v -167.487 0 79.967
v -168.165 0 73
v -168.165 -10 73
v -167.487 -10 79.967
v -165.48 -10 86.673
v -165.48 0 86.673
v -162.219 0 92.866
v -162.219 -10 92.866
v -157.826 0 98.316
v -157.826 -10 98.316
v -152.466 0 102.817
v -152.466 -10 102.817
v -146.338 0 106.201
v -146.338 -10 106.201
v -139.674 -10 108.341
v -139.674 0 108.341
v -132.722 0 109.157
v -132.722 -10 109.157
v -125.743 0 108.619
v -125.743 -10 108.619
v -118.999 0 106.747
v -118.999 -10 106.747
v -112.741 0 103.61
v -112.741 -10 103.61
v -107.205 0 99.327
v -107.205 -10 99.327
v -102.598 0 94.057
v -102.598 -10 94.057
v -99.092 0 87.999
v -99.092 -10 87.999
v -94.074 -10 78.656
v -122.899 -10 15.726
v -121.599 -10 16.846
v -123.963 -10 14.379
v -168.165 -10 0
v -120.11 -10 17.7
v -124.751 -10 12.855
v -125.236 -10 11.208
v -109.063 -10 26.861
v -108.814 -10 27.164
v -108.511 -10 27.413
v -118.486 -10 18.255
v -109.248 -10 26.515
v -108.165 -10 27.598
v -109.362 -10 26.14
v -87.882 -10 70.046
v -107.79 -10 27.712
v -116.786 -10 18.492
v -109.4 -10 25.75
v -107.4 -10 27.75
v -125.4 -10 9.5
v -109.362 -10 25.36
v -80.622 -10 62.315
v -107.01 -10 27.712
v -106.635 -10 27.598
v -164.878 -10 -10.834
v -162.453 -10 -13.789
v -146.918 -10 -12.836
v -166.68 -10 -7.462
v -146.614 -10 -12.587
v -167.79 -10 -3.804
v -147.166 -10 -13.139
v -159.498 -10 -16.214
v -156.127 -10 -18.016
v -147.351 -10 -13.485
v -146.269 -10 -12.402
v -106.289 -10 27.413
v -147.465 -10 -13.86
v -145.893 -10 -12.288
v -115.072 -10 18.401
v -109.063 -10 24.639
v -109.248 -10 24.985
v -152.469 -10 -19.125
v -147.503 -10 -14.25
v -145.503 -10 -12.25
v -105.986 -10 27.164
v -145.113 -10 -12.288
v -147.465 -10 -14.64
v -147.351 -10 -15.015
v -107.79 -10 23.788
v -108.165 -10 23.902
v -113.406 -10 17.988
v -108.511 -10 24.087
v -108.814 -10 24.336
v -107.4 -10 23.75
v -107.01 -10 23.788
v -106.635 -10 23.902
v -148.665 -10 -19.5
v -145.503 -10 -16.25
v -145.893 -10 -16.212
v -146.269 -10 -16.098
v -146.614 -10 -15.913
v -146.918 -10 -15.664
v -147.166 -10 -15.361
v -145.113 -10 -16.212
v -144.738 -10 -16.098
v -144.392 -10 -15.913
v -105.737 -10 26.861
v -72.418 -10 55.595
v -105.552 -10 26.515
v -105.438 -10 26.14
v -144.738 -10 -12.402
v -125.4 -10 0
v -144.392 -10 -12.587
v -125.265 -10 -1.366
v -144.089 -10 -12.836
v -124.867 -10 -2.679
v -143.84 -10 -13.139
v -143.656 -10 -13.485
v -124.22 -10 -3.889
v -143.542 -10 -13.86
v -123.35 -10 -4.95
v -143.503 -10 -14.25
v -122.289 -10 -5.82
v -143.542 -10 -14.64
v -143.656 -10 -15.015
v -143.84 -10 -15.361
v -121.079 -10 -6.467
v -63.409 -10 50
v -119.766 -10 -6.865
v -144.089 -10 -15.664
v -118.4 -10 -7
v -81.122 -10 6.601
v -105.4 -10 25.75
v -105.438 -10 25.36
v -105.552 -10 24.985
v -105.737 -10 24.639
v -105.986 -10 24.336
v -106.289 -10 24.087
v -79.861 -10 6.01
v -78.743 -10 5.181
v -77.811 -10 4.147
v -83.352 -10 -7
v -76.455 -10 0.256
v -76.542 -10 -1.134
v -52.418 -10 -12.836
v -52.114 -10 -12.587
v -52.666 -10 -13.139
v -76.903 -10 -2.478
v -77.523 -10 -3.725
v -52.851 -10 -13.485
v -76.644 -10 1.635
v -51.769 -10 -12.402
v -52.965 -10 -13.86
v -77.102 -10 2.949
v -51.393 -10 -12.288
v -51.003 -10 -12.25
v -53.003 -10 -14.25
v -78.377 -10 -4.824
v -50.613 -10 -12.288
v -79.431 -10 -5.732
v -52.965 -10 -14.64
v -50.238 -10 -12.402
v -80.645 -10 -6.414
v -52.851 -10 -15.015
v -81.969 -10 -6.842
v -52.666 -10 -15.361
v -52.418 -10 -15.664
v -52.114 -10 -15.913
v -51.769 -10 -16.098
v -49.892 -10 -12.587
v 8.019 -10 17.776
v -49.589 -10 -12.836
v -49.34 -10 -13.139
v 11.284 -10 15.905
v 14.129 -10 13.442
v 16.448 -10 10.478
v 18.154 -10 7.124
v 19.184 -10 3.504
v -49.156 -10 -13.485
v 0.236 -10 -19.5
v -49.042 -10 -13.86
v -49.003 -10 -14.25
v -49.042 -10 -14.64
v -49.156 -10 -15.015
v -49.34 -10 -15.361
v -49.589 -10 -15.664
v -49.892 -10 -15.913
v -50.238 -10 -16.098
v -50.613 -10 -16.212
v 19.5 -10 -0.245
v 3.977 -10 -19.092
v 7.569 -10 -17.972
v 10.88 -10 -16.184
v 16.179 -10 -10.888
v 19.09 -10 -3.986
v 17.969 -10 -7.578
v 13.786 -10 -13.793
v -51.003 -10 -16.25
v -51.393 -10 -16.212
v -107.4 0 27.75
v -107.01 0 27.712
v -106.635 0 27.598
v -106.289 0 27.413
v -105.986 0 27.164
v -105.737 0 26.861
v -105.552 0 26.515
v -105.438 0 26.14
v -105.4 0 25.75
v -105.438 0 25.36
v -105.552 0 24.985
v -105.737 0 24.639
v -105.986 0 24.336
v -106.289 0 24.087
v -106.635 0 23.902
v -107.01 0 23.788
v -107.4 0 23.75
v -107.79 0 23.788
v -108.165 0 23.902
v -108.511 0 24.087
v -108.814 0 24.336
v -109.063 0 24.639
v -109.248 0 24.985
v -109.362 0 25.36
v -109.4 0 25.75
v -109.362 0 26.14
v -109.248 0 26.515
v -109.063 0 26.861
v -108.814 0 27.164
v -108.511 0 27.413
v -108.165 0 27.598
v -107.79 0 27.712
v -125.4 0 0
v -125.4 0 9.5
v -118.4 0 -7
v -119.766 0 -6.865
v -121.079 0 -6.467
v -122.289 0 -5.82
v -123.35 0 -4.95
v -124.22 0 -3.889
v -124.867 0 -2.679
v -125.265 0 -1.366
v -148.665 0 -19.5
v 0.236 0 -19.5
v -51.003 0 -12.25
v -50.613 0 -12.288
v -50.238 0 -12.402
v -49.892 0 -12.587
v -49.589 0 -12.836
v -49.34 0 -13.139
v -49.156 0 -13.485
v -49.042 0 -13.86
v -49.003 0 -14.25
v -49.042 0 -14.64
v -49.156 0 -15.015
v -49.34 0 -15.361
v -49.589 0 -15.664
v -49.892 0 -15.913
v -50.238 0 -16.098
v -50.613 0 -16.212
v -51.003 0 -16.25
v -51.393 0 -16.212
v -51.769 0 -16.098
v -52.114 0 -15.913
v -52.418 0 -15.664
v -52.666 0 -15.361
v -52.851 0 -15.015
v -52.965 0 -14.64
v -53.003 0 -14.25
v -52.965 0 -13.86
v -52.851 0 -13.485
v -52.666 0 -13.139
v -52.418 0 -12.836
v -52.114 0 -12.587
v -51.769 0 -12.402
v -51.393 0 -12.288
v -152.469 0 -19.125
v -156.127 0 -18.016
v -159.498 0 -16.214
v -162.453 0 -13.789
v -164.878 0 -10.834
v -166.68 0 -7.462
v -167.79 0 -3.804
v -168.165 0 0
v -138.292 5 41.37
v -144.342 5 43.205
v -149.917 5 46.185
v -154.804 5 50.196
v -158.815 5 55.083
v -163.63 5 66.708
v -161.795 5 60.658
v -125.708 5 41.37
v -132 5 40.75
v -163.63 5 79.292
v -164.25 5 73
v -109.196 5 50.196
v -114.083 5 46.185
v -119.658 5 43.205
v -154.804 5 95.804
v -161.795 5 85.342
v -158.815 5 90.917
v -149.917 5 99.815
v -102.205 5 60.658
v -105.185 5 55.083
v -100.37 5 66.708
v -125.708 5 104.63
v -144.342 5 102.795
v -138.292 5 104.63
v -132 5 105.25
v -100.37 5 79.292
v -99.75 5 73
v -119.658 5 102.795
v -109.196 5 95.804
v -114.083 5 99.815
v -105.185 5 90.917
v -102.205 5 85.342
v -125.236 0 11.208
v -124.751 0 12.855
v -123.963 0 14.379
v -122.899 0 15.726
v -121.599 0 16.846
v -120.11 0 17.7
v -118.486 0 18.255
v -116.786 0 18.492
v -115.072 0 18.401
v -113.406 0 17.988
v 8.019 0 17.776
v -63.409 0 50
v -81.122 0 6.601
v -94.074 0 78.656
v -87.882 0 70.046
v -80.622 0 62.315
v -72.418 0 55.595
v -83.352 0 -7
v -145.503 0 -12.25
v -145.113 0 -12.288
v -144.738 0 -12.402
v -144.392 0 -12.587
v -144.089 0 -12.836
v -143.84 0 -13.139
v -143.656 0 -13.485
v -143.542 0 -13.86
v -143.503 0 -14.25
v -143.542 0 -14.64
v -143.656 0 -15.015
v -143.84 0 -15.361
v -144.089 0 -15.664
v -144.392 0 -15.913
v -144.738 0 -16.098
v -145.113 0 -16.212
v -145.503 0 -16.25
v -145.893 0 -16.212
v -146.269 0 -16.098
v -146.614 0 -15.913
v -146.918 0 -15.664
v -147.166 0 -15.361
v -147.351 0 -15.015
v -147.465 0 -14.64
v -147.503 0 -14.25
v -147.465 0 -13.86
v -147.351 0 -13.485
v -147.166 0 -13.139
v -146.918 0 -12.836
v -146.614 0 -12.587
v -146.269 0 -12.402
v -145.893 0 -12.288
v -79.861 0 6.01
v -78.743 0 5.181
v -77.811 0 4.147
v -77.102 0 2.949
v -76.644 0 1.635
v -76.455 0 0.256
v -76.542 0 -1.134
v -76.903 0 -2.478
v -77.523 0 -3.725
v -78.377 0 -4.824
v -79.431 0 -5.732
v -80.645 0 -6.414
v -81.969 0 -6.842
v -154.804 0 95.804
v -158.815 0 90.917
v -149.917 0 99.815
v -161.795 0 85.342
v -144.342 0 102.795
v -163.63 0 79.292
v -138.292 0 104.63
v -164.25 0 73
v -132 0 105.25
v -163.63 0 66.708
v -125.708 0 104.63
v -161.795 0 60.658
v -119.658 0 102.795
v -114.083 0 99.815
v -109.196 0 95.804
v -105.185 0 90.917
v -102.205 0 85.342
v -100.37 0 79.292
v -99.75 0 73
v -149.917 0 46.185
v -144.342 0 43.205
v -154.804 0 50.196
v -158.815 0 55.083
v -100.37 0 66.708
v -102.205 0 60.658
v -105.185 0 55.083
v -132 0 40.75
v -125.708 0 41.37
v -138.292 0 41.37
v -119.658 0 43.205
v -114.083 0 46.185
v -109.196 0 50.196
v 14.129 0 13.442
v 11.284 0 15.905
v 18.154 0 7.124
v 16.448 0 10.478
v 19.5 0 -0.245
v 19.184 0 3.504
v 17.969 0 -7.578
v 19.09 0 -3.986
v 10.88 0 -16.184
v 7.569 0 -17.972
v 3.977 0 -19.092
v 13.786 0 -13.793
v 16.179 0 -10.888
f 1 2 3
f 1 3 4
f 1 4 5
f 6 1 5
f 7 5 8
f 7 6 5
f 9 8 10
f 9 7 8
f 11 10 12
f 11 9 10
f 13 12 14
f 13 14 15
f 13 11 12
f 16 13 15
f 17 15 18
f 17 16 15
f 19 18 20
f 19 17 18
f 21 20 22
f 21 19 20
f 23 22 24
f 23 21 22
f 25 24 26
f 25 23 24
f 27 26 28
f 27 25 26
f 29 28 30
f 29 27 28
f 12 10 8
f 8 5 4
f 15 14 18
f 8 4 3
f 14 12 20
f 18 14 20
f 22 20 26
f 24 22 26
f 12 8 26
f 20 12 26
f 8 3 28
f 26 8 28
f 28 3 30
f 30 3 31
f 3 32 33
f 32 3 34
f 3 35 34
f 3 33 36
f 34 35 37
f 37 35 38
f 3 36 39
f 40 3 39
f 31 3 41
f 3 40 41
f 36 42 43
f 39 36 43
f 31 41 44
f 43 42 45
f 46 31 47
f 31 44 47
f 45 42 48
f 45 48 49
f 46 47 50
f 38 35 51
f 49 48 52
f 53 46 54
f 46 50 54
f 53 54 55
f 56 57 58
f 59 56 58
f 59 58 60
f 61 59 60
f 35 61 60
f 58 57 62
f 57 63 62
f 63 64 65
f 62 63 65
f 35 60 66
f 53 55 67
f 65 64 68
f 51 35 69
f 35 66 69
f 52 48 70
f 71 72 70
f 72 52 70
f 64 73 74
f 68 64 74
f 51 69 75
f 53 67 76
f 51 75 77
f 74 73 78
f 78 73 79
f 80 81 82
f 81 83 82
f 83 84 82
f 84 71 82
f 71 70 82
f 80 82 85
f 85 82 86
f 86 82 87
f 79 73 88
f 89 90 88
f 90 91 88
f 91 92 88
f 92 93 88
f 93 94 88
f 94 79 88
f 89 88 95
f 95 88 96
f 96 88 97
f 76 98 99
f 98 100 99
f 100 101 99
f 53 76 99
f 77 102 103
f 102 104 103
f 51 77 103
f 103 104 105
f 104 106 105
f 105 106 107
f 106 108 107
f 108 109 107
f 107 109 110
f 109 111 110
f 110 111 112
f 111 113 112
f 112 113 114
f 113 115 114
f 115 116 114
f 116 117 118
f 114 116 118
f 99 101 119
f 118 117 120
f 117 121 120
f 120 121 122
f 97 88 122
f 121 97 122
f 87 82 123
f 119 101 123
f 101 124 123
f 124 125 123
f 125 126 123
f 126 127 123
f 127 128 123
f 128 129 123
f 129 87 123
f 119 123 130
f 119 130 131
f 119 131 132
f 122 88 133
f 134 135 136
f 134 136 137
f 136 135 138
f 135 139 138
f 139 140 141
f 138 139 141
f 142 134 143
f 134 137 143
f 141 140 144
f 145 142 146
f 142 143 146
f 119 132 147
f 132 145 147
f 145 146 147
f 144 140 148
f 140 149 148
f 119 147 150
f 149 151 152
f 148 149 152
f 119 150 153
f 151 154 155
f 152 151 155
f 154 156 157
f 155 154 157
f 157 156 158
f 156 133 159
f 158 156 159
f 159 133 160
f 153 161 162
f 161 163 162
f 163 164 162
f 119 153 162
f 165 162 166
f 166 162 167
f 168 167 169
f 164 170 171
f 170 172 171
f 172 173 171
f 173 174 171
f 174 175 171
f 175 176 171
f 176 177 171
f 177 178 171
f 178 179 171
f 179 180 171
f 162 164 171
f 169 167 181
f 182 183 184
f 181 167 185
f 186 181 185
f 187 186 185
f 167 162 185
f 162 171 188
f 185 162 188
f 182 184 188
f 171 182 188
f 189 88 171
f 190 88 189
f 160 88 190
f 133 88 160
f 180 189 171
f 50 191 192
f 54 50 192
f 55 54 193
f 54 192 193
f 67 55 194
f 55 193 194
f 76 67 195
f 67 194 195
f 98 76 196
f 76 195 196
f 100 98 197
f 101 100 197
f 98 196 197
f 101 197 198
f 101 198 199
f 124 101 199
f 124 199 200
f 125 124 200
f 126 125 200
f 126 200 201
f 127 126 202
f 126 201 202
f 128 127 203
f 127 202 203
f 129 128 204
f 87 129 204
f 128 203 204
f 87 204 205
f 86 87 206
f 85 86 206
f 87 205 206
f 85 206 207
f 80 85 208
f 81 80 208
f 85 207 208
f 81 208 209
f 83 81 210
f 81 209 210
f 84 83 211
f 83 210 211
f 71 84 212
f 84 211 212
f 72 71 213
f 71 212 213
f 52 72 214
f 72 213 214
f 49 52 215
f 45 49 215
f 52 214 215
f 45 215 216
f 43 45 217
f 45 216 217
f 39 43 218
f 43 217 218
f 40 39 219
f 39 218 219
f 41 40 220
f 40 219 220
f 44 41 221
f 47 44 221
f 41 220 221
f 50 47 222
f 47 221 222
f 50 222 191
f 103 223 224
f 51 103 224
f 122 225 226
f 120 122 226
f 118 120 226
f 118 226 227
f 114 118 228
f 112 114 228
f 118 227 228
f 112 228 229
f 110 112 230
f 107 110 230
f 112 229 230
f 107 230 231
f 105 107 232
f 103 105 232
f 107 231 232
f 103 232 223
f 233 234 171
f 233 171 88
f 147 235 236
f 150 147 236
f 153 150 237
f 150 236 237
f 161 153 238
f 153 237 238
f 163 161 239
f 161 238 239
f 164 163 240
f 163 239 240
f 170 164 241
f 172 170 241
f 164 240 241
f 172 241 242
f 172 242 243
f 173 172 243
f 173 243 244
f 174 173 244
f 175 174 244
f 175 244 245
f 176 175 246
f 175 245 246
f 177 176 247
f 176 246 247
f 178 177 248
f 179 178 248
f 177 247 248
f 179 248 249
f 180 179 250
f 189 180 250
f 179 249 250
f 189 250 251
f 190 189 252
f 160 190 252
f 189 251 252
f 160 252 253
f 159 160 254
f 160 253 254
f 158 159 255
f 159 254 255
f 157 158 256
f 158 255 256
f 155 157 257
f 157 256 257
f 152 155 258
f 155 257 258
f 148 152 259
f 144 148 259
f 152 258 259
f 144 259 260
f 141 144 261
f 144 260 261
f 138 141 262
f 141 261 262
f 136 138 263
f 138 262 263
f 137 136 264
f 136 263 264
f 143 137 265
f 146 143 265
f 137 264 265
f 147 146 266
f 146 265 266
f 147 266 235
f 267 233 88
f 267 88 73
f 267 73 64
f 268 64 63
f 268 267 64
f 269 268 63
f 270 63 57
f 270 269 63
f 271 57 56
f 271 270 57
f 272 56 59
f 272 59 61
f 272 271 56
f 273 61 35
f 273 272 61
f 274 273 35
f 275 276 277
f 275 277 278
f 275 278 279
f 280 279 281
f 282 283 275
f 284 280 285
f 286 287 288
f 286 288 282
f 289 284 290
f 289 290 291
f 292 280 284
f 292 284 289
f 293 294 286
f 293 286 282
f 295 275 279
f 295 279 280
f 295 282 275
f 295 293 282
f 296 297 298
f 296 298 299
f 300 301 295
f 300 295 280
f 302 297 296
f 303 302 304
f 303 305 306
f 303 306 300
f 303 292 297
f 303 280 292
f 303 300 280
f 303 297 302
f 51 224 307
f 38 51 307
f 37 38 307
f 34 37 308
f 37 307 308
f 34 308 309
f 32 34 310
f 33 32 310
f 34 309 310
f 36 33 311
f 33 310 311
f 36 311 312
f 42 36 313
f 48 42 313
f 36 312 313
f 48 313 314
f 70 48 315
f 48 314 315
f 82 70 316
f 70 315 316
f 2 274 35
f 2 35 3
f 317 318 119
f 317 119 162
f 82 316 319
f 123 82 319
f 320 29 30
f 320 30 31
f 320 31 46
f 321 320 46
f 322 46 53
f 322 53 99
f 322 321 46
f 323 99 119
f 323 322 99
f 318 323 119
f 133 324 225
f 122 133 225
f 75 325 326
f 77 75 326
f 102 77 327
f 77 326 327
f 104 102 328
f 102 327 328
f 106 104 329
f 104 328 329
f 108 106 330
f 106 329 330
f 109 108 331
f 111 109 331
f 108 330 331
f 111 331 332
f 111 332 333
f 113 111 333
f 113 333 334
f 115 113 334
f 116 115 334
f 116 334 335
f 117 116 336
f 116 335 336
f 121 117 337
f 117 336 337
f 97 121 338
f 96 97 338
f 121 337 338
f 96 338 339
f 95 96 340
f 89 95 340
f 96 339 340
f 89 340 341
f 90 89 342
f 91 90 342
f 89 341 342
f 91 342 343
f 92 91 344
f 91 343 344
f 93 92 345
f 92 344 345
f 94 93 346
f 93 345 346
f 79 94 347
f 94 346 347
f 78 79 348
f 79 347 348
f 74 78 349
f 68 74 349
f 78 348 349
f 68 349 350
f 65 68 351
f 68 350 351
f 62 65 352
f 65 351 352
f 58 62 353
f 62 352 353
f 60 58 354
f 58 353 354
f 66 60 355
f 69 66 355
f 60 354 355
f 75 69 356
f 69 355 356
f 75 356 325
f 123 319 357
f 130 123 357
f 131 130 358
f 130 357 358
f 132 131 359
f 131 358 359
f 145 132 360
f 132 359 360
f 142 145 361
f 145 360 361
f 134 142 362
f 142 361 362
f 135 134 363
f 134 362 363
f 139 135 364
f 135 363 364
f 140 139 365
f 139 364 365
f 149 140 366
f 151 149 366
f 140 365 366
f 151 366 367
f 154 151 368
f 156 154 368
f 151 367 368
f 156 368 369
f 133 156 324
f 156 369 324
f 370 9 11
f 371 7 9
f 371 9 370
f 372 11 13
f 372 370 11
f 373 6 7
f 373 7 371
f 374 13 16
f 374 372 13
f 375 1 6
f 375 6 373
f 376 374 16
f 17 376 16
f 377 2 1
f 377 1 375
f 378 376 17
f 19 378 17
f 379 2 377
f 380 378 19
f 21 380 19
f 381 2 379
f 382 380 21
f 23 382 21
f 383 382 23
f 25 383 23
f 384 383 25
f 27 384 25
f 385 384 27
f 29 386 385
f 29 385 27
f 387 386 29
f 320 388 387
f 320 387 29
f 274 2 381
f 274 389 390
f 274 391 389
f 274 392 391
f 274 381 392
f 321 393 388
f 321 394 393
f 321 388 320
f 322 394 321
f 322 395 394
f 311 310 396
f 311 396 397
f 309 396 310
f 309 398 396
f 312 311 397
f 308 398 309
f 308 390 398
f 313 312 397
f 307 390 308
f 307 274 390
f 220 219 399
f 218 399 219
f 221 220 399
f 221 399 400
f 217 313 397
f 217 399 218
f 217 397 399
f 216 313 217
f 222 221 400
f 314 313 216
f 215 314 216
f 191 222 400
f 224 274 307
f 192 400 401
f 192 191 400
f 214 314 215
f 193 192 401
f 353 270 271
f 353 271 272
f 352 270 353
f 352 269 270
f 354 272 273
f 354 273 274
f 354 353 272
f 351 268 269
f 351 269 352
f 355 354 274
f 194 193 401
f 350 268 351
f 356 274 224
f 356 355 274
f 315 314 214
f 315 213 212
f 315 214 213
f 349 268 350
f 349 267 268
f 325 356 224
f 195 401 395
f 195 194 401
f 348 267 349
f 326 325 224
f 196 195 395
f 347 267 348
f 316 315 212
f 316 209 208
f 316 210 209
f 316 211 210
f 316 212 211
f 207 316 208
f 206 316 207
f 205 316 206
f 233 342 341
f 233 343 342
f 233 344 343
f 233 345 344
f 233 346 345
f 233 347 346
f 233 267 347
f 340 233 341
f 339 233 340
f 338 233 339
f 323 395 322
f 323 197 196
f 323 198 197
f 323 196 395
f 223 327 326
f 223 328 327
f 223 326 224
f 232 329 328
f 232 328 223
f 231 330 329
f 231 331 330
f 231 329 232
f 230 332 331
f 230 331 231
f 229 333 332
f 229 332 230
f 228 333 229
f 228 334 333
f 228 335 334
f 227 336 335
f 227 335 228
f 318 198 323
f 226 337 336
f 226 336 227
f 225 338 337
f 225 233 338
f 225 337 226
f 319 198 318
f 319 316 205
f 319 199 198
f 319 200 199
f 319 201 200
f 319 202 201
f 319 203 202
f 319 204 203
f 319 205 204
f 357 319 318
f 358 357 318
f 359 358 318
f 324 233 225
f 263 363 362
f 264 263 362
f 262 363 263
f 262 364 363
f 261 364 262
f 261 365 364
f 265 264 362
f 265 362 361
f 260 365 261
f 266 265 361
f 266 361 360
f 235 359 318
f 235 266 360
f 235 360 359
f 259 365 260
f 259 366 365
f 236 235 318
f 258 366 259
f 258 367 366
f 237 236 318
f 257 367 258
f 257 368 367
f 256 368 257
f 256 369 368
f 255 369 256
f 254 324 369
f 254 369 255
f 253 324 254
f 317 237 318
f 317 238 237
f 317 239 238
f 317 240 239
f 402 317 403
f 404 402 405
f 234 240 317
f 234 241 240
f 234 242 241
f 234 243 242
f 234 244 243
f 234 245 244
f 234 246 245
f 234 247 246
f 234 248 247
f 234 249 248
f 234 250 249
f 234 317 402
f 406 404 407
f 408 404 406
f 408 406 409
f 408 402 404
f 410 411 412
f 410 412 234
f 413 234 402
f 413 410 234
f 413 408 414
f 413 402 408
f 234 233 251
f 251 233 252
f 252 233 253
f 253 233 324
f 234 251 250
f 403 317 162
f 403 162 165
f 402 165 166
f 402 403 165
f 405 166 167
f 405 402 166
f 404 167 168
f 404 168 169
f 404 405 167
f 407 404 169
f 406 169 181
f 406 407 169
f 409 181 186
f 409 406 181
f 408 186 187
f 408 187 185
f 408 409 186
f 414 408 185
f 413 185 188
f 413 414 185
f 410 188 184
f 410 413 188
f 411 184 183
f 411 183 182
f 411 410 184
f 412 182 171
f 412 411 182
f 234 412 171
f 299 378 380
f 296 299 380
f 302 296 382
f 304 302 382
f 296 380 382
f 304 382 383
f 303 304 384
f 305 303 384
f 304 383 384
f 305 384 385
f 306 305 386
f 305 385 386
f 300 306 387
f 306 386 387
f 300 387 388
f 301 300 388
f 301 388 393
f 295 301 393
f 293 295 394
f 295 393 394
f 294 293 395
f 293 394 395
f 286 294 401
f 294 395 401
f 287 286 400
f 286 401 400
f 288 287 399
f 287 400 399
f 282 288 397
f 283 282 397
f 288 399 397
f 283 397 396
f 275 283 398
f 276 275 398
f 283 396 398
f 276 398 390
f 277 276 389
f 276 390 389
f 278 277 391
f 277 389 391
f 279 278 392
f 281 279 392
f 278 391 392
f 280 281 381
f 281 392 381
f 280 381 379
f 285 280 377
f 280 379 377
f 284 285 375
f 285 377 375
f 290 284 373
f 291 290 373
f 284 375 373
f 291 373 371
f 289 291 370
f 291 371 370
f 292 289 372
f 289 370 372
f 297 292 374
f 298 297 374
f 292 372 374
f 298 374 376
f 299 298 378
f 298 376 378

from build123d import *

# Parameters (mm, degrees)
SKETCH2_R           = 2
BOSS_EXTRUDE1_DEPTH = 10
SKETCH2_3_R         = 32.25
BOSS_EXTRUDE2_DEPTH = 5


with BuildPart() as part:
    # Sketch2 → Boss-Extrude1 (new body)
    with BuildSketch(Plane(origin=(0, 0, 0), x_dir=(1, 0, 0), z_dir=(0, 1, 0))):
        with BuildLine():
            Line((-168.164651686, 0), (-168.164651686, -73))
            ThreePointArc((-168.164651686, -73), (-139.674052468, -108.34106606), (-99.092179421, -87.998579142))
            ThreePointArc((-99.092179421, -87.998579142), (-84.378455589, -66.061963443), (-63.40890367, -50))
            Line((-63.40890367, -50), (8.019460447, -17.776215731))
            ThreePointArc((8.019460447, -17.776215731), (19.089691145, 3.986136419), (0.23577867, 19.5))
            Line((0.23577867, 19.5), (-148.664651686, 19.5))
            ThreePointArc((-148.664651686, 19.5), (-162.453233919, 13.788582233), (-168.164651686, 0))
        make_face()
        with Locations((-107.4, -25.75)):
            Circle(SKETCH2_R, mode=Mode.SUBTRACT)
        with Locations((-145.503297495, 14.25)):
            Circle(SKETCH2_R, mode=Mode.SUBTRACT)
        with BuildLine():
            Line((-125.4, -9.5), (-125.4, 0))
            ThreePointArc((-125.4, 0), (-123.349747468, 4.949747468), (-118.4, 7))
            Line((-118.4, 7), (-83.352457382, 7))
            ThreePointArc((-83.352457382, 7), (-76.542299164, 1.133670887), (-81.121681044, -6.600754354))
            Line((-81.121681044, -6.600754354), (-113.406447056, -17.987557998))
            ThreePointArc((-113.406447056, -17.987557998), (-121.59894333, -16.846494963), (-125.4, -9.5))
        make_face(mode=Mode.SUBTRACT)
        with Locations((-51.003297495, 14.25)):
            Circle(SKETCH2_R, mode=Mode.SUBTRACT)
    extrude(amount=-BOSS_EXTRUDE1_DEPTH)

    # Sketch2<3> → Boss-Extrude2 (add)
    with BuildSketch(Plane(origin=(0, 0, 0), x_dir=(1, 0, 0), z_dir=(0, 1, 0))):
        with Locations((-132, -73)):
            Circle(SKETCH2_3_R)
    extrude(amount=BOSS_EXTRUDE2_DEPTH)


solid = part.part
